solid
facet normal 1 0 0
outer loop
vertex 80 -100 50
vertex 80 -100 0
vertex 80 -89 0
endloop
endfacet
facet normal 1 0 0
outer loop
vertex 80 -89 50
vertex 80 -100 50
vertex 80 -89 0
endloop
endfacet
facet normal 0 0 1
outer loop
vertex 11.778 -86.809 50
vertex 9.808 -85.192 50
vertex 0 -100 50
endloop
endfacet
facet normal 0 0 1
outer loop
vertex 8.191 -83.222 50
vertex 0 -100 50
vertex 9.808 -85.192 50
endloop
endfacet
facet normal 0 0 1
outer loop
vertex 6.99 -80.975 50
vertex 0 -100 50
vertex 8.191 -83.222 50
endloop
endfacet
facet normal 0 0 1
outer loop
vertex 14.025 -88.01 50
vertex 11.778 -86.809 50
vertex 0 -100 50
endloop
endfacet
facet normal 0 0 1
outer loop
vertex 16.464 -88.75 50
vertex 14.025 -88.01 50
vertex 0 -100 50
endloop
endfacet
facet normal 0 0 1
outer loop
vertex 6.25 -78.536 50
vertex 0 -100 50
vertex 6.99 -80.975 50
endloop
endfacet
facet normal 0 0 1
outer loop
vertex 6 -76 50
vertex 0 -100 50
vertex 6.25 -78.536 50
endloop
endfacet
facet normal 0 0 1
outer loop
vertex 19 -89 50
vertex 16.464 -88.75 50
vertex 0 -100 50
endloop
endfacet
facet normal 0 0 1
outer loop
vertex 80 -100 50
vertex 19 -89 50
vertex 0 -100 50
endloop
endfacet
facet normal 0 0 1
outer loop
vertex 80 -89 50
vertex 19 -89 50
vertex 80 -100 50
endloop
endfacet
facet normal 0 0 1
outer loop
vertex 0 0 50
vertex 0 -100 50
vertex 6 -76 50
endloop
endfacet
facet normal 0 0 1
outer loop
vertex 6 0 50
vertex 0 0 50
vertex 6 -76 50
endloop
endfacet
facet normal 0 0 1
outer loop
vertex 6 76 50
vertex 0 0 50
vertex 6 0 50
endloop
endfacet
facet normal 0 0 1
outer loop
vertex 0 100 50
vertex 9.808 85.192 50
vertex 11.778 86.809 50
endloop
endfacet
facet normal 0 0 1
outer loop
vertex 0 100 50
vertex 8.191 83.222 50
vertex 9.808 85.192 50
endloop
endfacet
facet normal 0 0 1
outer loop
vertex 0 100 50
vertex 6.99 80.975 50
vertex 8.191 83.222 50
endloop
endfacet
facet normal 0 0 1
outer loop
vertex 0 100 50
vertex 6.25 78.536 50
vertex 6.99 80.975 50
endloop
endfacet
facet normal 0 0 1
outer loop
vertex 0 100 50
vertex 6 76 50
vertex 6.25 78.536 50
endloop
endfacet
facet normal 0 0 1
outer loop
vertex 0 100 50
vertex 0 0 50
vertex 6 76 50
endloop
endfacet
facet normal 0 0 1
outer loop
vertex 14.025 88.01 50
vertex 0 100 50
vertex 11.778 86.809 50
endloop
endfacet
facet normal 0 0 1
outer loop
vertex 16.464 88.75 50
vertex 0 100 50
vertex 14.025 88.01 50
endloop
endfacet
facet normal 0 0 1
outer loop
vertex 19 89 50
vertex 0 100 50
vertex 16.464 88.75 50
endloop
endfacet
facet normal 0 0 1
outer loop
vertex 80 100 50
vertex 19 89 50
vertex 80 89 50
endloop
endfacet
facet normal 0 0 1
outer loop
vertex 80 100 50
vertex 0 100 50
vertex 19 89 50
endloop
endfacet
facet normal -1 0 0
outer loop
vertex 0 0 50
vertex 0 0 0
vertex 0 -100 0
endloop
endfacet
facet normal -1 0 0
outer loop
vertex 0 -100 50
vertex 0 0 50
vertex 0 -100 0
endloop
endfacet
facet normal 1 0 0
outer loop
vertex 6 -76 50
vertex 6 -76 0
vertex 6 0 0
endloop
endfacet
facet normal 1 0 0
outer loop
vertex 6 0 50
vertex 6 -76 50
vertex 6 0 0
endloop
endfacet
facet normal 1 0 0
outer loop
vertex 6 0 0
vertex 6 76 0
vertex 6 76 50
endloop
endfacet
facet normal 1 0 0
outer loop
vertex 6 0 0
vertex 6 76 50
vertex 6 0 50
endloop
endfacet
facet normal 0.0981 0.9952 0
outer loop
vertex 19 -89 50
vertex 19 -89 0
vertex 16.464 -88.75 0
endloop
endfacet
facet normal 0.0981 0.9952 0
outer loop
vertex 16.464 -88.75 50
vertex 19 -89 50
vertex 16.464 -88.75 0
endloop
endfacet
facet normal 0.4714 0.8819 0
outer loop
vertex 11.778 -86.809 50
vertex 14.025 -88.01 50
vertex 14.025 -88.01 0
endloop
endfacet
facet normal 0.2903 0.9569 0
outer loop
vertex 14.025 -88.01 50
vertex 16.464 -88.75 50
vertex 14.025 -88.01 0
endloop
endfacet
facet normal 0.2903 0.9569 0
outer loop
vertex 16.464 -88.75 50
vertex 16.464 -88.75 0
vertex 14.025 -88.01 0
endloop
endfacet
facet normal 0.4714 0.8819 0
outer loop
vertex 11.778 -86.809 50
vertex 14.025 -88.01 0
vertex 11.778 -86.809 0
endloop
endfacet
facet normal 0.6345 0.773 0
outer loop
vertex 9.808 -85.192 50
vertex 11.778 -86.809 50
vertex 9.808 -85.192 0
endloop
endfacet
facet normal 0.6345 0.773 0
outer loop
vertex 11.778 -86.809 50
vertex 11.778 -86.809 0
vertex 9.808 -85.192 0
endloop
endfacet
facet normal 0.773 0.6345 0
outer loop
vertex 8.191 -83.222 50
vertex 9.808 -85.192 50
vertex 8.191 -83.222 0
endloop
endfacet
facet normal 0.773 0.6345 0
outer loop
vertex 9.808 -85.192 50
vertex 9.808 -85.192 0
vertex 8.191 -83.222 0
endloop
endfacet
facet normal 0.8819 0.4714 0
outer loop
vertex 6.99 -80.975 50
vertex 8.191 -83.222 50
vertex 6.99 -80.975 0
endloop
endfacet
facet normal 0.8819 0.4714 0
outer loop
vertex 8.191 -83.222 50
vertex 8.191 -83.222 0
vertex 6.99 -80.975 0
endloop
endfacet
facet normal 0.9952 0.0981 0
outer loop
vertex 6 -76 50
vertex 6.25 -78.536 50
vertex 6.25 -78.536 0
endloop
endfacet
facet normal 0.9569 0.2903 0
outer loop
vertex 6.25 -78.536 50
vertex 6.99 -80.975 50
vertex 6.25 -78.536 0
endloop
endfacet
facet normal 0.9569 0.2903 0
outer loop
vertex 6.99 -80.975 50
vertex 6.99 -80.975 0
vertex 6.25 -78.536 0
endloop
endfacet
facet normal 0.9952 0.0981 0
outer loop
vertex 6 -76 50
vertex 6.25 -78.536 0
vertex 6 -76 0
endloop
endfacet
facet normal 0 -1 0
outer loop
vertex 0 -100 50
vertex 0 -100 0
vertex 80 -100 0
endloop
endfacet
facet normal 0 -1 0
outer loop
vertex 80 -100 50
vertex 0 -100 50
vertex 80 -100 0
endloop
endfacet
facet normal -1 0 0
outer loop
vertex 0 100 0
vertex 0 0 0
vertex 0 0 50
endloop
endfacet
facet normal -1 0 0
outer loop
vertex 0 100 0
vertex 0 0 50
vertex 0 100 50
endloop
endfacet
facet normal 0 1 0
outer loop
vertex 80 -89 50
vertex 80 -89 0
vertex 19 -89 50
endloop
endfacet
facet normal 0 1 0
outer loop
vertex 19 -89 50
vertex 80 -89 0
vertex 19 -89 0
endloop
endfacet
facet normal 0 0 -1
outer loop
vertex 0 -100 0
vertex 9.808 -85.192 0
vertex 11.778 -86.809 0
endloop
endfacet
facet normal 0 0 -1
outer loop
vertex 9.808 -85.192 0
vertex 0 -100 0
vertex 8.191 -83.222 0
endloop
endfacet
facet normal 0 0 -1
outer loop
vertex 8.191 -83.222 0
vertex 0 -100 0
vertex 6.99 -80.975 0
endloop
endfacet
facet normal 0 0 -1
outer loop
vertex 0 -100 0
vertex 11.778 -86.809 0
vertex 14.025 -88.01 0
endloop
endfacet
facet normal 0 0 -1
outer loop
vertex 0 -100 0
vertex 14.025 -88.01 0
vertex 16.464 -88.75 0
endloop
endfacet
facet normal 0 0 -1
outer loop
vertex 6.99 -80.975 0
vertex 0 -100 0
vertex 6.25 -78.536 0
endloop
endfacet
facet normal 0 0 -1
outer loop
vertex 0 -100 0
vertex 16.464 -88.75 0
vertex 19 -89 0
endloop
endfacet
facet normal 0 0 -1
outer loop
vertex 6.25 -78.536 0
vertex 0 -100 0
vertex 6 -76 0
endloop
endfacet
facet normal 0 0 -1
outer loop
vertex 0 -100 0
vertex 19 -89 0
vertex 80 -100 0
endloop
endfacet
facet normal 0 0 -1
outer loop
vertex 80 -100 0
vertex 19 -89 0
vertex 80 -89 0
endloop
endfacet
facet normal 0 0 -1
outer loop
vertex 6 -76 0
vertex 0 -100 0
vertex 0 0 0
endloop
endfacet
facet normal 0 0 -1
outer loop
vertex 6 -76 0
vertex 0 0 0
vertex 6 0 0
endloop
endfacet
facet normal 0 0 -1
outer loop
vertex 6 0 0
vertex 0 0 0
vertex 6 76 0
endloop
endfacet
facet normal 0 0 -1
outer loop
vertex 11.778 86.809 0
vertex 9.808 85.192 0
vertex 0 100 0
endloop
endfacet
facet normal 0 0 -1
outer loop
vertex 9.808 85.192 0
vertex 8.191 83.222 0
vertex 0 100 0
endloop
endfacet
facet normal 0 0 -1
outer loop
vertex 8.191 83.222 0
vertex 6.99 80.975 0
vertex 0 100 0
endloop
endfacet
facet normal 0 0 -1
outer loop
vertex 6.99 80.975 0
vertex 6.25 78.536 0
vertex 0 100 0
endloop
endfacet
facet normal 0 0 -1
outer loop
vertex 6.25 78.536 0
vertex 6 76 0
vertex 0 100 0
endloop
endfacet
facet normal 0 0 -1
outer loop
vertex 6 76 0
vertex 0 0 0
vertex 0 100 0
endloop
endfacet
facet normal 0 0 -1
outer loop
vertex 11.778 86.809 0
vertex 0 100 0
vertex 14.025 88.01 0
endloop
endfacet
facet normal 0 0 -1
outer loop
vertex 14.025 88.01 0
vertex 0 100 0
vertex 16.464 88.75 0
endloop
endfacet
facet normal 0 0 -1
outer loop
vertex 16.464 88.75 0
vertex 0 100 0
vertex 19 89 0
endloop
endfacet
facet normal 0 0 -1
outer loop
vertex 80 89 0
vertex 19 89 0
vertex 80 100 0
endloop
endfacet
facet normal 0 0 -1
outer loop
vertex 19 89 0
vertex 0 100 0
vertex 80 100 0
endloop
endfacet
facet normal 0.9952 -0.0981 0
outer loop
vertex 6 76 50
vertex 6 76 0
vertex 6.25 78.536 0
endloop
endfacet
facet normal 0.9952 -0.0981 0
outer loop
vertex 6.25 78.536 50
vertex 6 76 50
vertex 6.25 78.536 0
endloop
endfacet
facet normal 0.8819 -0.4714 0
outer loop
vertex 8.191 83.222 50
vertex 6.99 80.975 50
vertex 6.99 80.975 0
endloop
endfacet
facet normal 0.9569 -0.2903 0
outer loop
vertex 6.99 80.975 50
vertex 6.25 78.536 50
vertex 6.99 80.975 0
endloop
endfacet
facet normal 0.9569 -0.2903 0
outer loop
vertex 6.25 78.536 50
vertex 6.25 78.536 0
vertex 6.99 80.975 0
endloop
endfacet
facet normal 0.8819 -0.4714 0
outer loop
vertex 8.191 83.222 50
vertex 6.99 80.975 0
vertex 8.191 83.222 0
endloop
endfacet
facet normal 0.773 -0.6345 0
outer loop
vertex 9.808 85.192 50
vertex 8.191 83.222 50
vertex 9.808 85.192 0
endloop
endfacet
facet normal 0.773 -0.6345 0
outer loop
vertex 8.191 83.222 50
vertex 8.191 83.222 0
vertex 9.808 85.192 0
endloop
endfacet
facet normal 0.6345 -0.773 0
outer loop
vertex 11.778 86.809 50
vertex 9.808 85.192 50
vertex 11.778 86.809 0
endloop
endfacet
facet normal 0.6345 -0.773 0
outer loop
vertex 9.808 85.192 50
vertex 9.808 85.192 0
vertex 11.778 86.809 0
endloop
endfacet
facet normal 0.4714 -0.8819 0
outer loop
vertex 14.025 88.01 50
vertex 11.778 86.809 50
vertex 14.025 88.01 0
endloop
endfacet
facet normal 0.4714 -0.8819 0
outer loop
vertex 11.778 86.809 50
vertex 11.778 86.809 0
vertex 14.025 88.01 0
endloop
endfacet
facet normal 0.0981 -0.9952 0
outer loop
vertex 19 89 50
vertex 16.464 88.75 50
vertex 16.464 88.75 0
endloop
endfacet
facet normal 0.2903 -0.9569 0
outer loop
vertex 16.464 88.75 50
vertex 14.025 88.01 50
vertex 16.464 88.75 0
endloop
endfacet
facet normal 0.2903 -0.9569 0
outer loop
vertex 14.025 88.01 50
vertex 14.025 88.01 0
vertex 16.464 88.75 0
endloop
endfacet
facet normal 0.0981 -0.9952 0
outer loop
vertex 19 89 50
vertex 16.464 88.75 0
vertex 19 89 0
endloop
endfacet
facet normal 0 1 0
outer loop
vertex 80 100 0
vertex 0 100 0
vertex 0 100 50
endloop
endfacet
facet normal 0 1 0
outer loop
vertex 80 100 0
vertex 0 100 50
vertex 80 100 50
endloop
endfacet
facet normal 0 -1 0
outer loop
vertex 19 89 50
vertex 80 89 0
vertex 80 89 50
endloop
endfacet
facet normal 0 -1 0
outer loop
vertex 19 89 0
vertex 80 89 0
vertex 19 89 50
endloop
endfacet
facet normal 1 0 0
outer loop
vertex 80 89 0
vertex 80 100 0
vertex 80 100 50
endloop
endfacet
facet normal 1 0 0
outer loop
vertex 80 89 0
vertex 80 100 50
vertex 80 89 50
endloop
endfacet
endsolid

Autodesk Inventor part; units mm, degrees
ref_plane "YZ Plane" through (0, 0, 0) normal (1, 0, 0) x (0, 1, 0)
ref_plane "Startebene" through (0, 0, 0) normal (0, 0, 1) x (1, 0, 0)
ref_plane "Endebene" through (0, 0, 50) normal (0, 0, 1) x (1, 0, 0)
sketch "Skizze" plane through (0, 0, 0) normal (0, 0, 1) x (1, 0, 0)
  line L0 (0, 0) -> (0, 100)
  line L1 (0, 100) -> (80, 100)
  line L2 (80, 100) -> (80, 89)
  line L3 (80, 89) -> (19, 89)
  line L4 (6, 76) -> (6, 0)
  line L5 (6, 0) -> (0, 0) construction
  line L6 (25.6, 100) -> (25.6, 89) construction
  line L7 (80, 89) -> (80, 89) construction
  line L8 (80, 89) -> (25.6, 89) construction
  line L9 (0, 12) -> (0, -30) construction
  line L10 (-1.5, 0) -> (19.5, 0) construction
  line L11 (0, 0) -> (0, -100)
  line L12 (0, -100) -> (80, -100)
  line L13 (80, -100) -> (80, -89)
  line L14 (80, -89) -> (19, -89)
  line L15 (6, -76) -> (6, 0)
  arc A0 (6, -76) -> (19, -89) centre (19, -76) ccw
  arc A1 (19, 89) -> (6, 76) centre (19, 76) ccw
  line L16 (0, 56) -> (0, -56) construction
  line L17 (-11.8, 0) -> (60.3, 0) construction
  point P0 (6, 89)
  point P1 (6, -89)
  point P2 (25.6, -100)
  point P3 (25.6, -89)
  dimension "d0" = 6
  dimension "d1" = 100
  dimension "d2" = 80
  dimension "d3" = 11
  dimension "d5" = 0
  dimension "d23" = 13
  dimension "d24" = 0
  dimension "d29" = 25.6
extrude "Körper" add sketch "Skizze" along normal up to surface (50 mm away) from surface at 0
sketch "Sketch3" plane through (0, 0, 0) normal (0, 0, 1) x (1, 0, 0)
  line L0 (0, 0) -> (10, 0)
ref_plane "Work Plane3" through (0, 0, 0) normal (0, -1, 0) x (1, 0, 0)
sketch "Sketch4" plane through (0, 0, 0) normal (0, -1, 0) x (1, 0, 0)
  line L0 (-2, 0) -> (12, 0)
  line L1 (-2, 50) -> (12, 50)
  dimension "d28" = 50
equation "\"d0\" = G_T"
equation "\"d1\" = 0.5 * G_H"
equation "\"d2\" = G_W"
equation "\"d3\" = G_T1"
equation "\"d23\" = G_IR"
equation "\"d29\" = G_C"
equation "\"d6\" = G_L"
equation "\"G_W\" = 80"
equation "\"G_T\" = 6"
equation "\"G_T1\" = 11"
equation "\"G_NG\" = 0"
equation "\"G_IR\" = 13"
equation "\"G_C\" = 25.6"
equation "\"G_L\" = d28"
equation "\"ex\" = 0"
equation "\"G_OFFSET_START\" = 0"
equation "\"G_OFFSET_END\" = 0"
equation "\"G_H\" = 200"
properties part number "DIN 1026-2 - UPE 200 - 50" material "Stahl, weich"
